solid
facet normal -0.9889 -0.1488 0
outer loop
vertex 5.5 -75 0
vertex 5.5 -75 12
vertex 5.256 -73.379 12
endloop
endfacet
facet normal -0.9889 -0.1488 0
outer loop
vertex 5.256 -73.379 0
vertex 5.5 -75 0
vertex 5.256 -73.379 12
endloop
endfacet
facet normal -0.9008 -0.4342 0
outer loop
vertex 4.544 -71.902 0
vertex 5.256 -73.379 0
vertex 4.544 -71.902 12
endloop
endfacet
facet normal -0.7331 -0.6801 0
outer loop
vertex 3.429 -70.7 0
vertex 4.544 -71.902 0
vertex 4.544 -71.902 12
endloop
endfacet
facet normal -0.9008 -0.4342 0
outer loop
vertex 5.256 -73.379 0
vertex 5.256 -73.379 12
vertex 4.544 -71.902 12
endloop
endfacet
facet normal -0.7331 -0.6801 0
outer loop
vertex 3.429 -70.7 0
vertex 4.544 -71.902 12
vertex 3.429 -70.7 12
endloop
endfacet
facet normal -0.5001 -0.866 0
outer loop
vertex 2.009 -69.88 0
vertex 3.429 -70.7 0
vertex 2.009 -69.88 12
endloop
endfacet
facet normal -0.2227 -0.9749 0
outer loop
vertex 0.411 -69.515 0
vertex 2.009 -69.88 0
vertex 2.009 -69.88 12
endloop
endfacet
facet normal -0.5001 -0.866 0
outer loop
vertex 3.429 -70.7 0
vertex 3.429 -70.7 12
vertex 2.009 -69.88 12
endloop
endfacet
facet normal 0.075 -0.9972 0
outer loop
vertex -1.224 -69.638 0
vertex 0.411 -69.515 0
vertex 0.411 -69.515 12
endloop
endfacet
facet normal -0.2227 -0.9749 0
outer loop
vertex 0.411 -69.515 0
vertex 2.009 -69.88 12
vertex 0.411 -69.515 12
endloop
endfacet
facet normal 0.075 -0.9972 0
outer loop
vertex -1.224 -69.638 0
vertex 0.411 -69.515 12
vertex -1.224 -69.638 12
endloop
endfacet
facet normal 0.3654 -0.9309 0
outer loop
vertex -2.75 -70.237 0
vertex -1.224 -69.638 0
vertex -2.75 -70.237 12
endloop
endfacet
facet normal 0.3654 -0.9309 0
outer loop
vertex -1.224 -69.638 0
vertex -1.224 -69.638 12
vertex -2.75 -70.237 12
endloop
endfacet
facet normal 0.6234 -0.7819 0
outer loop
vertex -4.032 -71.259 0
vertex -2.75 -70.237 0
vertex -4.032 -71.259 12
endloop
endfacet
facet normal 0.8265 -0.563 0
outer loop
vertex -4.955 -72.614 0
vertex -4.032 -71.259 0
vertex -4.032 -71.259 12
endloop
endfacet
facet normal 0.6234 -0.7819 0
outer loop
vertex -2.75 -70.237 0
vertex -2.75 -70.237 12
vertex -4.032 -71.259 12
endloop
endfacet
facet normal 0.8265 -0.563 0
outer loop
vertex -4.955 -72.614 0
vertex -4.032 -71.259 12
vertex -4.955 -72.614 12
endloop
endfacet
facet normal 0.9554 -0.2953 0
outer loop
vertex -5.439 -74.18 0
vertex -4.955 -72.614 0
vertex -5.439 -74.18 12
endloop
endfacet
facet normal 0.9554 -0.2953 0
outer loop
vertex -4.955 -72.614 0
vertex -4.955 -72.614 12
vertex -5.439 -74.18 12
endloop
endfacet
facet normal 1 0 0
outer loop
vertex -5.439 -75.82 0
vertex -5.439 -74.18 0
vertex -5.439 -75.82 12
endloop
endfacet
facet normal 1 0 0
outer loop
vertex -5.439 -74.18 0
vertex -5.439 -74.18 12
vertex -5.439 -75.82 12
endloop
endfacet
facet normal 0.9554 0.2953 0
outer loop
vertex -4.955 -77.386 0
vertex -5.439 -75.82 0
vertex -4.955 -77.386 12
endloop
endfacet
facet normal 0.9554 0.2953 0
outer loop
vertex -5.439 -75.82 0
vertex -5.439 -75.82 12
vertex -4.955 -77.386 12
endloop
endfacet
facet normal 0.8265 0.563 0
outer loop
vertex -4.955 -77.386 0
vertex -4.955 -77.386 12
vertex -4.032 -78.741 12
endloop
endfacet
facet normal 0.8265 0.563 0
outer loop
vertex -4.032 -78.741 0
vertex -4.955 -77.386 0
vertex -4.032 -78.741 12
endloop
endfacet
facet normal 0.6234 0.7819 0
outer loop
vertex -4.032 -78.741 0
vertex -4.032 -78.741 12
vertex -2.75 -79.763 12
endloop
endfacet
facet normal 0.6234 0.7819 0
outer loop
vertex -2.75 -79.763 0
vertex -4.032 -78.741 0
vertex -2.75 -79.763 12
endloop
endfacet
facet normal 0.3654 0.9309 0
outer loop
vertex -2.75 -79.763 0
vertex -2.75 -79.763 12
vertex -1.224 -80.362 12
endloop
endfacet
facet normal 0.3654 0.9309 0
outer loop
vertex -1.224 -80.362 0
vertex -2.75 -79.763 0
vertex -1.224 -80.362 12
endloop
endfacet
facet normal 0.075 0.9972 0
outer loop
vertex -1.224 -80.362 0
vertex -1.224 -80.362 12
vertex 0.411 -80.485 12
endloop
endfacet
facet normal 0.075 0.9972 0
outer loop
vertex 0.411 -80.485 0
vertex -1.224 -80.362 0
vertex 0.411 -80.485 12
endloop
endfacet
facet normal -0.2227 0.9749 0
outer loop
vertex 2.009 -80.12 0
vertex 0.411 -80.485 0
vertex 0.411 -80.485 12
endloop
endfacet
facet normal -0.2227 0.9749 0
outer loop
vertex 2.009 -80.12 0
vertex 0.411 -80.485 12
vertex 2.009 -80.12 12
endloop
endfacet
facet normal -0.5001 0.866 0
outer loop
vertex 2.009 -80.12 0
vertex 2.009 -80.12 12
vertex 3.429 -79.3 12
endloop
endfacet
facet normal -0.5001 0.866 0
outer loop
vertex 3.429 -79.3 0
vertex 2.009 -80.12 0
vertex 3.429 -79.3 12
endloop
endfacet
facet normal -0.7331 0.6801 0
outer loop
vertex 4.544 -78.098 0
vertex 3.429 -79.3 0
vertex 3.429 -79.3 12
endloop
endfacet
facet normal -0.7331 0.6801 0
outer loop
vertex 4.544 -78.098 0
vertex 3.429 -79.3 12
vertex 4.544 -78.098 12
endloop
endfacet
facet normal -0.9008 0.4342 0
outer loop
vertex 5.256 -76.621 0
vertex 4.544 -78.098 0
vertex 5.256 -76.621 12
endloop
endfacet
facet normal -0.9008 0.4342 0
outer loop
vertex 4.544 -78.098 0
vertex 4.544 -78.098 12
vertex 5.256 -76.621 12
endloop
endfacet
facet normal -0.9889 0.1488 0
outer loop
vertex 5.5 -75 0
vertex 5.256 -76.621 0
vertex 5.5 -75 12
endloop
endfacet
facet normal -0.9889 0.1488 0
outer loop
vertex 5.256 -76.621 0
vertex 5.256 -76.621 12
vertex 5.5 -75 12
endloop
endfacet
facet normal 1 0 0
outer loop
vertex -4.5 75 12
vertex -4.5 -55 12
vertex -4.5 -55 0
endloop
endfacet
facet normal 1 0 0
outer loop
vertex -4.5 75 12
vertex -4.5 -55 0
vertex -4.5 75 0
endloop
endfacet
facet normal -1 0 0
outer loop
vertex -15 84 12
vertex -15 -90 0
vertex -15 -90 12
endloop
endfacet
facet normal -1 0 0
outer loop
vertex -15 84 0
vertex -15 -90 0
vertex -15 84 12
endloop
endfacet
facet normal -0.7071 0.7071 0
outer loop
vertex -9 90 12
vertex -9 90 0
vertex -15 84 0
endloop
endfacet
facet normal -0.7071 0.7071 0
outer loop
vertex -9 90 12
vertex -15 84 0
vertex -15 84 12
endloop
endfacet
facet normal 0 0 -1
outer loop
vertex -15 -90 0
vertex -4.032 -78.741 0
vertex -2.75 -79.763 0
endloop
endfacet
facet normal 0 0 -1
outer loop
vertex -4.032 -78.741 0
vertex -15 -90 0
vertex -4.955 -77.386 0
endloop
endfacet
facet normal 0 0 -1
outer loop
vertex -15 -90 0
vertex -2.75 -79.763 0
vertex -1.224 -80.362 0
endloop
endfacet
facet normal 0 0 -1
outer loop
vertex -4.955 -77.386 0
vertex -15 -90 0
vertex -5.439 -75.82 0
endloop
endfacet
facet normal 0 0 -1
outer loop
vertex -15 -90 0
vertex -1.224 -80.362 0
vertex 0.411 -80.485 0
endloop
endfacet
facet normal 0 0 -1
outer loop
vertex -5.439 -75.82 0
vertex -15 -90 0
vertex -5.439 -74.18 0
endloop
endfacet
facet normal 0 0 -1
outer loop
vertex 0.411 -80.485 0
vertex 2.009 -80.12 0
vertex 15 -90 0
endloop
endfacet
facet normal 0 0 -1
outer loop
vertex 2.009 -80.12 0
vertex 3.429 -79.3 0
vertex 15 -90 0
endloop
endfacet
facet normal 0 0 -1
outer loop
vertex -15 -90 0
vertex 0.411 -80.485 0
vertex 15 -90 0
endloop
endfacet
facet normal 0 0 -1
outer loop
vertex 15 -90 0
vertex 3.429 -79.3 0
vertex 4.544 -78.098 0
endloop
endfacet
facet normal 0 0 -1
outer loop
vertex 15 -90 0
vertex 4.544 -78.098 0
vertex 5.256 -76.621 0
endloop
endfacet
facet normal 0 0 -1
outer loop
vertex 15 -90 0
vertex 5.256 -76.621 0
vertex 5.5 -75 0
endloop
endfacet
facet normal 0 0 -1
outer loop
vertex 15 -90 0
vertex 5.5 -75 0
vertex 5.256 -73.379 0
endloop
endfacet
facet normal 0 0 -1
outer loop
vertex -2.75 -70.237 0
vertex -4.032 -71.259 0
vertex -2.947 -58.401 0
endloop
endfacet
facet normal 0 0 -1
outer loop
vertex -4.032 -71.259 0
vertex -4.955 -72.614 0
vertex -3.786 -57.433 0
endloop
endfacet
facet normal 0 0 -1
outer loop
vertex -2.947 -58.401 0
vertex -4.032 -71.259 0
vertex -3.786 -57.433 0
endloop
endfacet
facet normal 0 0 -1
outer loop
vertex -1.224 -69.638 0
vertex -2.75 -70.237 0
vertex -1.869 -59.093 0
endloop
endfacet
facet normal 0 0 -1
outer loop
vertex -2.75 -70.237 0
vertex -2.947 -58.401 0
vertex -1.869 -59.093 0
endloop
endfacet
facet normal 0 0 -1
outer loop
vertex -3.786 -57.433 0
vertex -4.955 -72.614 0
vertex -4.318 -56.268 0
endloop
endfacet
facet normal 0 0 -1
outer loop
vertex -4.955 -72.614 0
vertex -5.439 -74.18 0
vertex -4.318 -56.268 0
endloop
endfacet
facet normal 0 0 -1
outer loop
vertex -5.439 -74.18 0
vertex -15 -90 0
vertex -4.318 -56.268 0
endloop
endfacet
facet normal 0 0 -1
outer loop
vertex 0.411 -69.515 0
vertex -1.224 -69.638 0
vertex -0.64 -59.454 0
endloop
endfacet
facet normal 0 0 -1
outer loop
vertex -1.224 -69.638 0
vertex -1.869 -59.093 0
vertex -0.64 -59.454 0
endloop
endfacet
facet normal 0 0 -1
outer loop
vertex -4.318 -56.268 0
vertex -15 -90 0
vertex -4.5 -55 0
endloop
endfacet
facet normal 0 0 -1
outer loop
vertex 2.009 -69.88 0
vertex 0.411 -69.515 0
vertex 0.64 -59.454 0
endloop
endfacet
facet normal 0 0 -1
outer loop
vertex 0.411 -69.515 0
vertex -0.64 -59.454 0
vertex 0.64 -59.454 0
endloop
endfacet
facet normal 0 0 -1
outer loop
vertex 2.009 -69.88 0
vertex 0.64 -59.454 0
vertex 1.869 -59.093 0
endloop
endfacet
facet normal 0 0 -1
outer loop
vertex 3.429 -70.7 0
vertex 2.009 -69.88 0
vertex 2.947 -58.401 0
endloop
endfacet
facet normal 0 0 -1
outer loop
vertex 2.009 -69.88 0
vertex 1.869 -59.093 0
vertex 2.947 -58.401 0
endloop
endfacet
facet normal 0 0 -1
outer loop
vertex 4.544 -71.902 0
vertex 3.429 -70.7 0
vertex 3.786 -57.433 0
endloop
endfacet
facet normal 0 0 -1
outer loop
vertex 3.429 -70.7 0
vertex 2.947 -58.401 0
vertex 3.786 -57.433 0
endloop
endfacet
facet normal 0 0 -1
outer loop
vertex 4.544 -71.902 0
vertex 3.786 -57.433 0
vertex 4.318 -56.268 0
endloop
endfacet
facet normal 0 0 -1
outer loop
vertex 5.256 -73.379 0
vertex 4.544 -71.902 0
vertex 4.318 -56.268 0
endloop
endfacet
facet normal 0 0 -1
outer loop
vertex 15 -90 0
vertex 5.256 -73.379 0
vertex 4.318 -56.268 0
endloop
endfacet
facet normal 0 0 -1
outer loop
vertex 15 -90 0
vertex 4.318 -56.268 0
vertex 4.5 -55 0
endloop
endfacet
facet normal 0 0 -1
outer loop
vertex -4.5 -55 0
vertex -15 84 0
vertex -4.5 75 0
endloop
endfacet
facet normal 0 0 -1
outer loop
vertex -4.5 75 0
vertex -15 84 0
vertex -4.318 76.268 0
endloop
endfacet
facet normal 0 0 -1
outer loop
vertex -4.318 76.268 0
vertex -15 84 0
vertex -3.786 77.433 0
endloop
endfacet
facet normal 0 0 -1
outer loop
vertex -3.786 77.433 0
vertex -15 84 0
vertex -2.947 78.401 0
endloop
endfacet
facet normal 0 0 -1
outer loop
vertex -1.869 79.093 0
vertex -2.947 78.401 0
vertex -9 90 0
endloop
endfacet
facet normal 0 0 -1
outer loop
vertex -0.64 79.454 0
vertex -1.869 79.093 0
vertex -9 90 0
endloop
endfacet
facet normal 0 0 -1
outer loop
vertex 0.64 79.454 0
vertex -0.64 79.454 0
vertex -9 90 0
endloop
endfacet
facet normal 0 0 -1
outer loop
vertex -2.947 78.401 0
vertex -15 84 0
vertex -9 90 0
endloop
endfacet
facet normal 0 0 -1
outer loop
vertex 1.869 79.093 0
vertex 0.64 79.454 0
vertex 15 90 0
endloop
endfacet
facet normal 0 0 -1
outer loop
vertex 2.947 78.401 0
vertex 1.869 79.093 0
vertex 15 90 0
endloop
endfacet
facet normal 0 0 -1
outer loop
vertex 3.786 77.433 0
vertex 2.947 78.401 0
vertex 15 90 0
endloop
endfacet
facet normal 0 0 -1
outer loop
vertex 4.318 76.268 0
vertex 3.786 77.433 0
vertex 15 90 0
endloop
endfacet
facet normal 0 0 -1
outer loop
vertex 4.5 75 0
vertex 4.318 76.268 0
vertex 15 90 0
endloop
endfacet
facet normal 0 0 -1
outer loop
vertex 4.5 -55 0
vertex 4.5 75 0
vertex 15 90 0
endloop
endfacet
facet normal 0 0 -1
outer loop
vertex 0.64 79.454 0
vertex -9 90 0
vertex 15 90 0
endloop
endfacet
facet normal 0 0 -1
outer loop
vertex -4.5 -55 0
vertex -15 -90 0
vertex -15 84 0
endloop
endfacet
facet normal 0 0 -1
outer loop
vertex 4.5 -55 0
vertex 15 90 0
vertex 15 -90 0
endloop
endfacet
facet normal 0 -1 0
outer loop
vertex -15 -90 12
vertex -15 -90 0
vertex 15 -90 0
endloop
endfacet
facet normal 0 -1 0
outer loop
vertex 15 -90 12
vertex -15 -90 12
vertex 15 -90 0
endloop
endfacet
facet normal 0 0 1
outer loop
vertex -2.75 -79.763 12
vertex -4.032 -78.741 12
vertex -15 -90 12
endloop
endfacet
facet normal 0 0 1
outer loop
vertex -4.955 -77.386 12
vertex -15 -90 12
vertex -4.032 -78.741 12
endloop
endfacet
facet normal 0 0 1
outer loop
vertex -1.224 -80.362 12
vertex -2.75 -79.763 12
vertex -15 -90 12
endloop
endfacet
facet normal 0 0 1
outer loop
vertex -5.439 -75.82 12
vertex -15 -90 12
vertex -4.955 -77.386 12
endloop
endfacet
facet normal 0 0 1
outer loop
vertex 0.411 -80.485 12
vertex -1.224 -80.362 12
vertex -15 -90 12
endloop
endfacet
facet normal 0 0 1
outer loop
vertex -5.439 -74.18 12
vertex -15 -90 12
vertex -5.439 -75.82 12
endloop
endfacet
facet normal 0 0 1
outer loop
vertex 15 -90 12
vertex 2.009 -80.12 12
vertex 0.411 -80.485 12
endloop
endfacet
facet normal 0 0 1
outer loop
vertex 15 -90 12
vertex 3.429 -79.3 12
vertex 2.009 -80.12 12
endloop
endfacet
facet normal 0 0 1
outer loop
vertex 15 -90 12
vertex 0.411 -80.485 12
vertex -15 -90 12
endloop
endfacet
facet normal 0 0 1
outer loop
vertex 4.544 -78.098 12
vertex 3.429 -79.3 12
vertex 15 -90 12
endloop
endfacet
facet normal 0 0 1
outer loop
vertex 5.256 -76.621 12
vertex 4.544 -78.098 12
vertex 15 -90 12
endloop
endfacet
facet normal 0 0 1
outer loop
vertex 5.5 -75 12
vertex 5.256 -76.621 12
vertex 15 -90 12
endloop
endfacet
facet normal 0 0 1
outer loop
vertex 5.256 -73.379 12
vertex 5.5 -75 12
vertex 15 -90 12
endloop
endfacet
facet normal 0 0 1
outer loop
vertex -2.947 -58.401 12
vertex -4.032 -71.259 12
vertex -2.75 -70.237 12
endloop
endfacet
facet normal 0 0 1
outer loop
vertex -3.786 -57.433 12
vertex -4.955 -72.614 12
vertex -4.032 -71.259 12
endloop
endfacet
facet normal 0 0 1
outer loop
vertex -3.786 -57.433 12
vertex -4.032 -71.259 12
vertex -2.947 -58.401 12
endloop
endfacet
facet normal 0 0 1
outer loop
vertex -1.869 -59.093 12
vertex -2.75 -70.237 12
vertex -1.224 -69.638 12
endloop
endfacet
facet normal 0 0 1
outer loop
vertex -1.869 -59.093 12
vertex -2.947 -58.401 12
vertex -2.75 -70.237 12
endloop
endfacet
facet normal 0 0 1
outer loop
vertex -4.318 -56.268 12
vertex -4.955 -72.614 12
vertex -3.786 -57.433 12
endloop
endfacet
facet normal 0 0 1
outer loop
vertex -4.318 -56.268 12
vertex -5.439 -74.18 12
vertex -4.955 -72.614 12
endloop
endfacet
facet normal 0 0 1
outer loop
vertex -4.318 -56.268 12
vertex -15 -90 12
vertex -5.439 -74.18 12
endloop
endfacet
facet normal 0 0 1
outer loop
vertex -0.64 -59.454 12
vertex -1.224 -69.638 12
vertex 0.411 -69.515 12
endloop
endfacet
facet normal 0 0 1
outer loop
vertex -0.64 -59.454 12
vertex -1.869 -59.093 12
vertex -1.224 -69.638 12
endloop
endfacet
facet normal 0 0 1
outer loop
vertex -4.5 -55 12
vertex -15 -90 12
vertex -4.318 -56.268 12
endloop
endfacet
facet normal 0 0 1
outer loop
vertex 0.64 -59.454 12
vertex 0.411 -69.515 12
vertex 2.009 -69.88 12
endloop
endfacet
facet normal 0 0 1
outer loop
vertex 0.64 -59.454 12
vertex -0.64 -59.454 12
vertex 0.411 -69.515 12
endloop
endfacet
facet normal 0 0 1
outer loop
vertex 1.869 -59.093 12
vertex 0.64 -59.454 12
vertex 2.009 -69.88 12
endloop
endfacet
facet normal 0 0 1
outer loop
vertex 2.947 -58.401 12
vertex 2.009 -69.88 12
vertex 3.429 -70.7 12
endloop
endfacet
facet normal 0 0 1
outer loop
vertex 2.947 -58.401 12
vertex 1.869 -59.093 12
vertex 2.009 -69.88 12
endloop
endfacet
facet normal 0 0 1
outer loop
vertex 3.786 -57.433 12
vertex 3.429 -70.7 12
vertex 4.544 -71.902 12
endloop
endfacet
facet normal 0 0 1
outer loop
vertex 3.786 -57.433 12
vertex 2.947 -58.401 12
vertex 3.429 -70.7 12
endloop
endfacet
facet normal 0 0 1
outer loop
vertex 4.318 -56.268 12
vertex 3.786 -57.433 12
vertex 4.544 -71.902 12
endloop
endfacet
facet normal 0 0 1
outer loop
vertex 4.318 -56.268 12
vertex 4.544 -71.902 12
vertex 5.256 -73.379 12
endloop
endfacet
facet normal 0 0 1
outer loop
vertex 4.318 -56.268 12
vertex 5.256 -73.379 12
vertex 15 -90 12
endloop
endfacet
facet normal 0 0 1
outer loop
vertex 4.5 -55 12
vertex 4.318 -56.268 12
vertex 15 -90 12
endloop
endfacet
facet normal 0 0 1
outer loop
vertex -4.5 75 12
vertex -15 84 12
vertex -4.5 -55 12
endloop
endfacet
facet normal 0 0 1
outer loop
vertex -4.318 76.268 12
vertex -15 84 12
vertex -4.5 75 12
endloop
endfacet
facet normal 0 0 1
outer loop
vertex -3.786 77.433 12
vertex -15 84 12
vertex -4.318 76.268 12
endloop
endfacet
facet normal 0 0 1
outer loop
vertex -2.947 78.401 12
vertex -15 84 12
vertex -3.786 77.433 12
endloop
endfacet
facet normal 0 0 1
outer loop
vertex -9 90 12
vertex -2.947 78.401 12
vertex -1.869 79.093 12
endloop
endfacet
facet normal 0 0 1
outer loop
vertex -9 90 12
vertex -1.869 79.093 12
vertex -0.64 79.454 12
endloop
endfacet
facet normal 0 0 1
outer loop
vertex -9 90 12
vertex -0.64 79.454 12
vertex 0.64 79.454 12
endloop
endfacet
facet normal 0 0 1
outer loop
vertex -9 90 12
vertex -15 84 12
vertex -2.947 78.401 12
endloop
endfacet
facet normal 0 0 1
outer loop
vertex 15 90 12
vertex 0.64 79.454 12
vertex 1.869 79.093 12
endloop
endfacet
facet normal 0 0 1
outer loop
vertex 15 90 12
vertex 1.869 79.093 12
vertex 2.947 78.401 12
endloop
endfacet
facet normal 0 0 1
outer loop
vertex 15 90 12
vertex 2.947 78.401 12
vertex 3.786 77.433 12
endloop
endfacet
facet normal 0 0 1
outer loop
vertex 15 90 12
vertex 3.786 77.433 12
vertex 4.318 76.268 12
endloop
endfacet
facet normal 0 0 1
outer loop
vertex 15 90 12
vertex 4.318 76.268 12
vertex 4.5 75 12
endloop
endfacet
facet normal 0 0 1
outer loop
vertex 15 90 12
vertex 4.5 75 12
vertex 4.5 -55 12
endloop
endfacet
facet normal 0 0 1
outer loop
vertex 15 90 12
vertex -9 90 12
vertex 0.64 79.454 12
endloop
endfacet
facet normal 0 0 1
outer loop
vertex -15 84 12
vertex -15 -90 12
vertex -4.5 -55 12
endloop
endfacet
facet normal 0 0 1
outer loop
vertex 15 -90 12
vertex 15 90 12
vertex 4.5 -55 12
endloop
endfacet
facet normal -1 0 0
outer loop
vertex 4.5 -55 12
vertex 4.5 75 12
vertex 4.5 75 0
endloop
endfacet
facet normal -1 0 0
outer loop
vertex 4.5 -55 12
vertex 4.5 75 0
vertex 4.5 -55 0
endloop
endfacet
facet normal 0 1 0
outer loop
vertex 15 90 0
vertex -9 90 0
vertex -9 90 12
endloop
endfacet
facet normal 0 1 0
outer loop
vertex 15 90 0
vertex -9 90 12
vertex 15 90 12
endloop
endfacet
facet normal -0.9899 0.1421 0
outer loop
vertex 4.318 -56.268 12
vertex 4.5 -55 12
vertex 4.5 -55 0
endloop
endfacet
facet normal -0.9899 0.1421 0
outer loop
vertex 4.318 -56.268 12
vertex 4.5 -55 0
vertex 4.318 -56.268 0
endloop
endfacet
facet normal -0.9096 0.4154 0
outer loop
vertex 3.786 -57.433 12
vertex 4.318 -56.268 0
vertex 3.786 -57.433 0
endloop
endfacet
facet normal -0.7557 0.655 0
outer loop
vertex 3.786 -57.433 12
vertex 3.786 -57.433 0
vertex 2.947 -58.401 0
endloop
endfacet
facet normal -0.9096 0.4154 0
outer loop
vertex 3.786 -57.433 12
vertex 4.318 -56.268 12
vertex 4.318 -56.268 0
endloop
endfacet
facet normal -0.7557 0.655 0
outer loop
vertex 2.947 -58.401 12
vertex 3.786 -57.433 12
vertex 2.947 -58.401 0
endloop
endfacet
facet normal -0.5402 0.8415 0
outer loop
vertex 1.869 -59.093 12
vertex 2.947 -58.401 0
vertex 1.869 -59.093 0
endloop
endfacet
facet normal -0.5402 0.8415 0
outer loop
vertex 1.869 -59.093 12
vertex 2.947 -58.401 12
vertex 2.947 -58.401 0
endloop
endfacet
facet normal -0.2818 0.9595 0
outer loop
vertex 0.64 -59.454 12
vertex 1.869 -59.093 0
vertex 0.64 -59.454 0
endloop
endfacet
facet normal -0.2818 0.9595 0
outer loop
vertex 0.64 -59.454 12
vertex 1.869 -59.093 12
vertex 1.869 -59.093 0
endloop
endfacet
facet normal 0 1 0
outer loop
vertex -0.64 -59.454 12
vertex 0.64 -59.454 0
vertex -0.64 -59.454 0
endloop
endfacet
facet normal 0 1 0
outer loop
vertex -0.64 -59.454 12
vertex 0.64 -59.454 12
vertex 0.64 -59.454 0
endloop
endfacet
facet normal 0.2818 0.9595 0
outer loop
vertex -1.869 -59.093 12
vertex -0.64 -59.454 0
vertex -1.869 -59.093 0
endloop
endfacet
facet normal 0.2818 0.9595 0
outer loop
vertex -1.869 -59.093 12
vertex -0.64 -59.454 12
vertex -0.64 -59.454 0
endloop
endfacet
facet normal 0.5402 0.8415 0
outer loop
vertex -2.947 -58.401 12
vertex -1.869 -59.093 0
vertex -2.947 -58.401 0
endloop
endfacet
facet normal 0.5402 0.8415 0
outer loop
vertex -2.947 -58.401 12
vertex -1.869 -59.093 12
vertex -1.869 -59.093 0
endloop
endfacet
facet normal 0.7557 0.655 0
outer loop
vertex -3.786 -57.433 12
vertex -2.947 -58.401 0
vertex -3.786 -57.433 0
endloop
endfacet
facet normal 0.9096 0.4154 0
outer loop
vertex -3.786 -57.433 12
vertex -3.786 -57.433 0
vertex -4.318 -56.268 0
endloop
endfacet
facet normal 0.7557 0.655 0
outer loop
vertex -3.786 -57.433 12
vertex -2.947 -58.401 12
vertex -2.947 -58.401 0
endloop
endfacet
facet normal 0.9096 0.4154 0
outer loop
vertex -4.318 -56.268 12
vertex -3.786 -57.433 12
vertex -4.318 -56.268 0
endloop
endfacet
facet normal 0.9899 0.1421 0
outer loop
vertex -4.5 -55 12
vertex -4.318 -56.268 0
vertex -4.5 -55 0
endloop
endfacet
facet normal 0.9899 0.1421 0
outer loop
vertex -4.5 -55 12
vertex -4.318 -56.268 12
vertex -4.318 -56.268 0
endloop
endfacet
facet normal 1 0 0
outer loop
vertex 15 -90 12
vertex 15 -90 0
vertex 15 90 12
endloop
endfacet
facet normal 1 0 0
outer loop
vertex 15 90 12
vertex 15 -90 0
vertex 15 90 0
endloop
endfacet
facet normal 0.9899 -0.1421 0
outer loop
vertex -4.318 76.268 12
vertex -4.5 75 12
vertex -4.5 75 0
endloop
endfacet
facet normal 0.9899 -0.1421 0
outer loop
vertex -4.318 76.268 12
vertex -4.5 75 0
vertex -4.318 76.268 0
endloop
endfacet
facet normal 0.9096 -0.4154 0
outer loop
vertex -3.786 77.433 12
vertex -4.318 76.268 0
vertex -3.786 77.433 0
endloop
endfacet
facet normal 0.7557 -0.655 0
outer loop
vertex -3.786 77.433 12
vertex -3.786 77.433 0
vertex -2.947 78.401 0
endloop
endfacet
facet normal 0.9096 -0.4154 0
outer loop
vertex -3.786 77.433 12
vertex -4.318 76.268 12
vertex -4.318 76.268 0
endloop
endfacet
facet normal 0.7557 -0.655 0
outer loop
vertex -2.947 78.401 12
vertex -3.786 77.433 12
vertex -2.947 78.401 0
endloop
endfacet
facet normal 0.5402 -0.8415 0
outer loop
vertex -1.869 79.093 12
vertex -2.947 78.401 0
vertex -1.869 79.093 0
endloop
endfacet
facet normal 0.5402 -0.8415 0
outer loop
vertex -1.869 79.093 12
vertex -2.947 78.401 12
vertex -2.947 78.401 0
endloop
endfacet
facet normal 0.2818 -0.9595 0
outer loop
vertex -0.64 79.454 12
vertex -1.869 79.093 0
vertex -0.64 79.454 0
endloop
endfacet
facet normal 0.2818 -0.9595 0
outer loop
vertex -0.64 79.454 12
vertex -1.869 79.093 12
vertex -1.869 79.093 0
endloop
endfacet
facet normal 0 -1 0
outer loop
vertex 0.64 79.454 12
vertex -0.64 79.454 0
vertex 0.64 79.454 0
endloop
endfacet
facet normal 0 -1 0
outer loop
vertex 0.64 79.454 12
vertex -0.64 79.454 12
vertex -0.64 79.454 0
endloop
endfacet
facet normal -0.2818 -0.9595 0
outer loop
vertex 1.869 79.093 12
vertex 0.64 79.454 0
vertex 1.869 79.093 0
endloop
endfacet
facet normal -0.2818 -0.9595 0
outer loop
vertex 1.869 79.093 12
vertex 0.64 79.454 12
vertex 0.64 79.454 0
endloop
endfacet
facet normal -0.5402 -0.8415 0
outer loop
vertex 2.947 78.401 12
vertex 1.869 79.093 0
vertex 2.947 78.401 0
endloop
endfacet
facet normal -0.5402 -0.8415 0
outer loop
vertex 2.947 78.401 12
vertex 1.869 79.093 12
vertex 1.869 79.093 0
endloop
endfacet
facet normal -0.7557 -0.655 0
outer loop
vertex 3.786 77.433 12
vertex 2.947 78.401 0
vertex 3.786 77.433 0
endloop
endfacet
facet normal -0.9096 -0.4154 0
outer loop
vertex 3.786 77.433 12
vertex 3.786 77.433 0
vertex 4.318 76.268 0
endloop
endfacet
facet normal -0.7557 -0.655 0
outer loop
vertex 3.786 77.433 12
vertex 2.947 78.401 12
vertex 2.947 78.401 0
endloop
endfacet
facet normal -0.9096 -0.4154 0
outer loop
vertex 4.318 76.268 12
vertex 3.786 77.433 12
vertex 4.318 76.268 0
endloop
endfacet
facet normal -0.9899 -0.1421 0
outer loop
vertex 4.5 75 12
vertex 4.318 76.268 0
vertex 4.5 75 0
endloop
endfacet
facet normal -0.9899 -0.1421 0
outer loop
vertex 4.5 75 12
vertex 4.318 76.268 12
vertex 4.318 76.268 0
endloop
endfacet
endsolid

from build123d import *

# Parameters (mm, degrees)
SKETCH_1_W          = 30
SKETCH_1_H          = 180
EXTRUDE_1_DEPTH     = 12
SKETCH_2_R          = 5.5
CUT_EXTRUDE_1_DEPTH = 12
CHAMFER_1_SIZE      = 6


with BuildPart() as part:
    # 草图1 → 凸台-拉伸1 (new body)
    with BuildSketch(Plane.XY):
        Rectangle(SKETCH_1_W, SKETCH_1_H)
    extrude(amount=EXTRUDE_1_DEPTH)

    # 草图2 → 切除-拉伸1 (cut)
    with BuildSketch(Plane.XY.offset(12)):
        with Locations((0, -75)):
            Circle(SKETCH_2_R)
        with BuildLine():
            Line((4.5, 75), (4.5, -55))
            ThreePointArc((4.5, -55), (0, -59.5), (-4.5, -55))
            Line((-4.5, -55), (-4.5, 75))
            ThreePointArc((-4.5, 75), (0, 79.5), (4.5, 75))
        make_face()
    extrude(amount=-CUT_EXTRUDE_1_DEPTH, mode=Mode.SUBTRACT)

    # 倒角1
    chamfer_1_edges = [part.edges().sort_by_distance(p)[0] for p in [
        (-15, 90, 6),
    ]]
    chamfer(chamfer_1_edges, length=CHAMFER_1_SIZE)


solid = part.part
